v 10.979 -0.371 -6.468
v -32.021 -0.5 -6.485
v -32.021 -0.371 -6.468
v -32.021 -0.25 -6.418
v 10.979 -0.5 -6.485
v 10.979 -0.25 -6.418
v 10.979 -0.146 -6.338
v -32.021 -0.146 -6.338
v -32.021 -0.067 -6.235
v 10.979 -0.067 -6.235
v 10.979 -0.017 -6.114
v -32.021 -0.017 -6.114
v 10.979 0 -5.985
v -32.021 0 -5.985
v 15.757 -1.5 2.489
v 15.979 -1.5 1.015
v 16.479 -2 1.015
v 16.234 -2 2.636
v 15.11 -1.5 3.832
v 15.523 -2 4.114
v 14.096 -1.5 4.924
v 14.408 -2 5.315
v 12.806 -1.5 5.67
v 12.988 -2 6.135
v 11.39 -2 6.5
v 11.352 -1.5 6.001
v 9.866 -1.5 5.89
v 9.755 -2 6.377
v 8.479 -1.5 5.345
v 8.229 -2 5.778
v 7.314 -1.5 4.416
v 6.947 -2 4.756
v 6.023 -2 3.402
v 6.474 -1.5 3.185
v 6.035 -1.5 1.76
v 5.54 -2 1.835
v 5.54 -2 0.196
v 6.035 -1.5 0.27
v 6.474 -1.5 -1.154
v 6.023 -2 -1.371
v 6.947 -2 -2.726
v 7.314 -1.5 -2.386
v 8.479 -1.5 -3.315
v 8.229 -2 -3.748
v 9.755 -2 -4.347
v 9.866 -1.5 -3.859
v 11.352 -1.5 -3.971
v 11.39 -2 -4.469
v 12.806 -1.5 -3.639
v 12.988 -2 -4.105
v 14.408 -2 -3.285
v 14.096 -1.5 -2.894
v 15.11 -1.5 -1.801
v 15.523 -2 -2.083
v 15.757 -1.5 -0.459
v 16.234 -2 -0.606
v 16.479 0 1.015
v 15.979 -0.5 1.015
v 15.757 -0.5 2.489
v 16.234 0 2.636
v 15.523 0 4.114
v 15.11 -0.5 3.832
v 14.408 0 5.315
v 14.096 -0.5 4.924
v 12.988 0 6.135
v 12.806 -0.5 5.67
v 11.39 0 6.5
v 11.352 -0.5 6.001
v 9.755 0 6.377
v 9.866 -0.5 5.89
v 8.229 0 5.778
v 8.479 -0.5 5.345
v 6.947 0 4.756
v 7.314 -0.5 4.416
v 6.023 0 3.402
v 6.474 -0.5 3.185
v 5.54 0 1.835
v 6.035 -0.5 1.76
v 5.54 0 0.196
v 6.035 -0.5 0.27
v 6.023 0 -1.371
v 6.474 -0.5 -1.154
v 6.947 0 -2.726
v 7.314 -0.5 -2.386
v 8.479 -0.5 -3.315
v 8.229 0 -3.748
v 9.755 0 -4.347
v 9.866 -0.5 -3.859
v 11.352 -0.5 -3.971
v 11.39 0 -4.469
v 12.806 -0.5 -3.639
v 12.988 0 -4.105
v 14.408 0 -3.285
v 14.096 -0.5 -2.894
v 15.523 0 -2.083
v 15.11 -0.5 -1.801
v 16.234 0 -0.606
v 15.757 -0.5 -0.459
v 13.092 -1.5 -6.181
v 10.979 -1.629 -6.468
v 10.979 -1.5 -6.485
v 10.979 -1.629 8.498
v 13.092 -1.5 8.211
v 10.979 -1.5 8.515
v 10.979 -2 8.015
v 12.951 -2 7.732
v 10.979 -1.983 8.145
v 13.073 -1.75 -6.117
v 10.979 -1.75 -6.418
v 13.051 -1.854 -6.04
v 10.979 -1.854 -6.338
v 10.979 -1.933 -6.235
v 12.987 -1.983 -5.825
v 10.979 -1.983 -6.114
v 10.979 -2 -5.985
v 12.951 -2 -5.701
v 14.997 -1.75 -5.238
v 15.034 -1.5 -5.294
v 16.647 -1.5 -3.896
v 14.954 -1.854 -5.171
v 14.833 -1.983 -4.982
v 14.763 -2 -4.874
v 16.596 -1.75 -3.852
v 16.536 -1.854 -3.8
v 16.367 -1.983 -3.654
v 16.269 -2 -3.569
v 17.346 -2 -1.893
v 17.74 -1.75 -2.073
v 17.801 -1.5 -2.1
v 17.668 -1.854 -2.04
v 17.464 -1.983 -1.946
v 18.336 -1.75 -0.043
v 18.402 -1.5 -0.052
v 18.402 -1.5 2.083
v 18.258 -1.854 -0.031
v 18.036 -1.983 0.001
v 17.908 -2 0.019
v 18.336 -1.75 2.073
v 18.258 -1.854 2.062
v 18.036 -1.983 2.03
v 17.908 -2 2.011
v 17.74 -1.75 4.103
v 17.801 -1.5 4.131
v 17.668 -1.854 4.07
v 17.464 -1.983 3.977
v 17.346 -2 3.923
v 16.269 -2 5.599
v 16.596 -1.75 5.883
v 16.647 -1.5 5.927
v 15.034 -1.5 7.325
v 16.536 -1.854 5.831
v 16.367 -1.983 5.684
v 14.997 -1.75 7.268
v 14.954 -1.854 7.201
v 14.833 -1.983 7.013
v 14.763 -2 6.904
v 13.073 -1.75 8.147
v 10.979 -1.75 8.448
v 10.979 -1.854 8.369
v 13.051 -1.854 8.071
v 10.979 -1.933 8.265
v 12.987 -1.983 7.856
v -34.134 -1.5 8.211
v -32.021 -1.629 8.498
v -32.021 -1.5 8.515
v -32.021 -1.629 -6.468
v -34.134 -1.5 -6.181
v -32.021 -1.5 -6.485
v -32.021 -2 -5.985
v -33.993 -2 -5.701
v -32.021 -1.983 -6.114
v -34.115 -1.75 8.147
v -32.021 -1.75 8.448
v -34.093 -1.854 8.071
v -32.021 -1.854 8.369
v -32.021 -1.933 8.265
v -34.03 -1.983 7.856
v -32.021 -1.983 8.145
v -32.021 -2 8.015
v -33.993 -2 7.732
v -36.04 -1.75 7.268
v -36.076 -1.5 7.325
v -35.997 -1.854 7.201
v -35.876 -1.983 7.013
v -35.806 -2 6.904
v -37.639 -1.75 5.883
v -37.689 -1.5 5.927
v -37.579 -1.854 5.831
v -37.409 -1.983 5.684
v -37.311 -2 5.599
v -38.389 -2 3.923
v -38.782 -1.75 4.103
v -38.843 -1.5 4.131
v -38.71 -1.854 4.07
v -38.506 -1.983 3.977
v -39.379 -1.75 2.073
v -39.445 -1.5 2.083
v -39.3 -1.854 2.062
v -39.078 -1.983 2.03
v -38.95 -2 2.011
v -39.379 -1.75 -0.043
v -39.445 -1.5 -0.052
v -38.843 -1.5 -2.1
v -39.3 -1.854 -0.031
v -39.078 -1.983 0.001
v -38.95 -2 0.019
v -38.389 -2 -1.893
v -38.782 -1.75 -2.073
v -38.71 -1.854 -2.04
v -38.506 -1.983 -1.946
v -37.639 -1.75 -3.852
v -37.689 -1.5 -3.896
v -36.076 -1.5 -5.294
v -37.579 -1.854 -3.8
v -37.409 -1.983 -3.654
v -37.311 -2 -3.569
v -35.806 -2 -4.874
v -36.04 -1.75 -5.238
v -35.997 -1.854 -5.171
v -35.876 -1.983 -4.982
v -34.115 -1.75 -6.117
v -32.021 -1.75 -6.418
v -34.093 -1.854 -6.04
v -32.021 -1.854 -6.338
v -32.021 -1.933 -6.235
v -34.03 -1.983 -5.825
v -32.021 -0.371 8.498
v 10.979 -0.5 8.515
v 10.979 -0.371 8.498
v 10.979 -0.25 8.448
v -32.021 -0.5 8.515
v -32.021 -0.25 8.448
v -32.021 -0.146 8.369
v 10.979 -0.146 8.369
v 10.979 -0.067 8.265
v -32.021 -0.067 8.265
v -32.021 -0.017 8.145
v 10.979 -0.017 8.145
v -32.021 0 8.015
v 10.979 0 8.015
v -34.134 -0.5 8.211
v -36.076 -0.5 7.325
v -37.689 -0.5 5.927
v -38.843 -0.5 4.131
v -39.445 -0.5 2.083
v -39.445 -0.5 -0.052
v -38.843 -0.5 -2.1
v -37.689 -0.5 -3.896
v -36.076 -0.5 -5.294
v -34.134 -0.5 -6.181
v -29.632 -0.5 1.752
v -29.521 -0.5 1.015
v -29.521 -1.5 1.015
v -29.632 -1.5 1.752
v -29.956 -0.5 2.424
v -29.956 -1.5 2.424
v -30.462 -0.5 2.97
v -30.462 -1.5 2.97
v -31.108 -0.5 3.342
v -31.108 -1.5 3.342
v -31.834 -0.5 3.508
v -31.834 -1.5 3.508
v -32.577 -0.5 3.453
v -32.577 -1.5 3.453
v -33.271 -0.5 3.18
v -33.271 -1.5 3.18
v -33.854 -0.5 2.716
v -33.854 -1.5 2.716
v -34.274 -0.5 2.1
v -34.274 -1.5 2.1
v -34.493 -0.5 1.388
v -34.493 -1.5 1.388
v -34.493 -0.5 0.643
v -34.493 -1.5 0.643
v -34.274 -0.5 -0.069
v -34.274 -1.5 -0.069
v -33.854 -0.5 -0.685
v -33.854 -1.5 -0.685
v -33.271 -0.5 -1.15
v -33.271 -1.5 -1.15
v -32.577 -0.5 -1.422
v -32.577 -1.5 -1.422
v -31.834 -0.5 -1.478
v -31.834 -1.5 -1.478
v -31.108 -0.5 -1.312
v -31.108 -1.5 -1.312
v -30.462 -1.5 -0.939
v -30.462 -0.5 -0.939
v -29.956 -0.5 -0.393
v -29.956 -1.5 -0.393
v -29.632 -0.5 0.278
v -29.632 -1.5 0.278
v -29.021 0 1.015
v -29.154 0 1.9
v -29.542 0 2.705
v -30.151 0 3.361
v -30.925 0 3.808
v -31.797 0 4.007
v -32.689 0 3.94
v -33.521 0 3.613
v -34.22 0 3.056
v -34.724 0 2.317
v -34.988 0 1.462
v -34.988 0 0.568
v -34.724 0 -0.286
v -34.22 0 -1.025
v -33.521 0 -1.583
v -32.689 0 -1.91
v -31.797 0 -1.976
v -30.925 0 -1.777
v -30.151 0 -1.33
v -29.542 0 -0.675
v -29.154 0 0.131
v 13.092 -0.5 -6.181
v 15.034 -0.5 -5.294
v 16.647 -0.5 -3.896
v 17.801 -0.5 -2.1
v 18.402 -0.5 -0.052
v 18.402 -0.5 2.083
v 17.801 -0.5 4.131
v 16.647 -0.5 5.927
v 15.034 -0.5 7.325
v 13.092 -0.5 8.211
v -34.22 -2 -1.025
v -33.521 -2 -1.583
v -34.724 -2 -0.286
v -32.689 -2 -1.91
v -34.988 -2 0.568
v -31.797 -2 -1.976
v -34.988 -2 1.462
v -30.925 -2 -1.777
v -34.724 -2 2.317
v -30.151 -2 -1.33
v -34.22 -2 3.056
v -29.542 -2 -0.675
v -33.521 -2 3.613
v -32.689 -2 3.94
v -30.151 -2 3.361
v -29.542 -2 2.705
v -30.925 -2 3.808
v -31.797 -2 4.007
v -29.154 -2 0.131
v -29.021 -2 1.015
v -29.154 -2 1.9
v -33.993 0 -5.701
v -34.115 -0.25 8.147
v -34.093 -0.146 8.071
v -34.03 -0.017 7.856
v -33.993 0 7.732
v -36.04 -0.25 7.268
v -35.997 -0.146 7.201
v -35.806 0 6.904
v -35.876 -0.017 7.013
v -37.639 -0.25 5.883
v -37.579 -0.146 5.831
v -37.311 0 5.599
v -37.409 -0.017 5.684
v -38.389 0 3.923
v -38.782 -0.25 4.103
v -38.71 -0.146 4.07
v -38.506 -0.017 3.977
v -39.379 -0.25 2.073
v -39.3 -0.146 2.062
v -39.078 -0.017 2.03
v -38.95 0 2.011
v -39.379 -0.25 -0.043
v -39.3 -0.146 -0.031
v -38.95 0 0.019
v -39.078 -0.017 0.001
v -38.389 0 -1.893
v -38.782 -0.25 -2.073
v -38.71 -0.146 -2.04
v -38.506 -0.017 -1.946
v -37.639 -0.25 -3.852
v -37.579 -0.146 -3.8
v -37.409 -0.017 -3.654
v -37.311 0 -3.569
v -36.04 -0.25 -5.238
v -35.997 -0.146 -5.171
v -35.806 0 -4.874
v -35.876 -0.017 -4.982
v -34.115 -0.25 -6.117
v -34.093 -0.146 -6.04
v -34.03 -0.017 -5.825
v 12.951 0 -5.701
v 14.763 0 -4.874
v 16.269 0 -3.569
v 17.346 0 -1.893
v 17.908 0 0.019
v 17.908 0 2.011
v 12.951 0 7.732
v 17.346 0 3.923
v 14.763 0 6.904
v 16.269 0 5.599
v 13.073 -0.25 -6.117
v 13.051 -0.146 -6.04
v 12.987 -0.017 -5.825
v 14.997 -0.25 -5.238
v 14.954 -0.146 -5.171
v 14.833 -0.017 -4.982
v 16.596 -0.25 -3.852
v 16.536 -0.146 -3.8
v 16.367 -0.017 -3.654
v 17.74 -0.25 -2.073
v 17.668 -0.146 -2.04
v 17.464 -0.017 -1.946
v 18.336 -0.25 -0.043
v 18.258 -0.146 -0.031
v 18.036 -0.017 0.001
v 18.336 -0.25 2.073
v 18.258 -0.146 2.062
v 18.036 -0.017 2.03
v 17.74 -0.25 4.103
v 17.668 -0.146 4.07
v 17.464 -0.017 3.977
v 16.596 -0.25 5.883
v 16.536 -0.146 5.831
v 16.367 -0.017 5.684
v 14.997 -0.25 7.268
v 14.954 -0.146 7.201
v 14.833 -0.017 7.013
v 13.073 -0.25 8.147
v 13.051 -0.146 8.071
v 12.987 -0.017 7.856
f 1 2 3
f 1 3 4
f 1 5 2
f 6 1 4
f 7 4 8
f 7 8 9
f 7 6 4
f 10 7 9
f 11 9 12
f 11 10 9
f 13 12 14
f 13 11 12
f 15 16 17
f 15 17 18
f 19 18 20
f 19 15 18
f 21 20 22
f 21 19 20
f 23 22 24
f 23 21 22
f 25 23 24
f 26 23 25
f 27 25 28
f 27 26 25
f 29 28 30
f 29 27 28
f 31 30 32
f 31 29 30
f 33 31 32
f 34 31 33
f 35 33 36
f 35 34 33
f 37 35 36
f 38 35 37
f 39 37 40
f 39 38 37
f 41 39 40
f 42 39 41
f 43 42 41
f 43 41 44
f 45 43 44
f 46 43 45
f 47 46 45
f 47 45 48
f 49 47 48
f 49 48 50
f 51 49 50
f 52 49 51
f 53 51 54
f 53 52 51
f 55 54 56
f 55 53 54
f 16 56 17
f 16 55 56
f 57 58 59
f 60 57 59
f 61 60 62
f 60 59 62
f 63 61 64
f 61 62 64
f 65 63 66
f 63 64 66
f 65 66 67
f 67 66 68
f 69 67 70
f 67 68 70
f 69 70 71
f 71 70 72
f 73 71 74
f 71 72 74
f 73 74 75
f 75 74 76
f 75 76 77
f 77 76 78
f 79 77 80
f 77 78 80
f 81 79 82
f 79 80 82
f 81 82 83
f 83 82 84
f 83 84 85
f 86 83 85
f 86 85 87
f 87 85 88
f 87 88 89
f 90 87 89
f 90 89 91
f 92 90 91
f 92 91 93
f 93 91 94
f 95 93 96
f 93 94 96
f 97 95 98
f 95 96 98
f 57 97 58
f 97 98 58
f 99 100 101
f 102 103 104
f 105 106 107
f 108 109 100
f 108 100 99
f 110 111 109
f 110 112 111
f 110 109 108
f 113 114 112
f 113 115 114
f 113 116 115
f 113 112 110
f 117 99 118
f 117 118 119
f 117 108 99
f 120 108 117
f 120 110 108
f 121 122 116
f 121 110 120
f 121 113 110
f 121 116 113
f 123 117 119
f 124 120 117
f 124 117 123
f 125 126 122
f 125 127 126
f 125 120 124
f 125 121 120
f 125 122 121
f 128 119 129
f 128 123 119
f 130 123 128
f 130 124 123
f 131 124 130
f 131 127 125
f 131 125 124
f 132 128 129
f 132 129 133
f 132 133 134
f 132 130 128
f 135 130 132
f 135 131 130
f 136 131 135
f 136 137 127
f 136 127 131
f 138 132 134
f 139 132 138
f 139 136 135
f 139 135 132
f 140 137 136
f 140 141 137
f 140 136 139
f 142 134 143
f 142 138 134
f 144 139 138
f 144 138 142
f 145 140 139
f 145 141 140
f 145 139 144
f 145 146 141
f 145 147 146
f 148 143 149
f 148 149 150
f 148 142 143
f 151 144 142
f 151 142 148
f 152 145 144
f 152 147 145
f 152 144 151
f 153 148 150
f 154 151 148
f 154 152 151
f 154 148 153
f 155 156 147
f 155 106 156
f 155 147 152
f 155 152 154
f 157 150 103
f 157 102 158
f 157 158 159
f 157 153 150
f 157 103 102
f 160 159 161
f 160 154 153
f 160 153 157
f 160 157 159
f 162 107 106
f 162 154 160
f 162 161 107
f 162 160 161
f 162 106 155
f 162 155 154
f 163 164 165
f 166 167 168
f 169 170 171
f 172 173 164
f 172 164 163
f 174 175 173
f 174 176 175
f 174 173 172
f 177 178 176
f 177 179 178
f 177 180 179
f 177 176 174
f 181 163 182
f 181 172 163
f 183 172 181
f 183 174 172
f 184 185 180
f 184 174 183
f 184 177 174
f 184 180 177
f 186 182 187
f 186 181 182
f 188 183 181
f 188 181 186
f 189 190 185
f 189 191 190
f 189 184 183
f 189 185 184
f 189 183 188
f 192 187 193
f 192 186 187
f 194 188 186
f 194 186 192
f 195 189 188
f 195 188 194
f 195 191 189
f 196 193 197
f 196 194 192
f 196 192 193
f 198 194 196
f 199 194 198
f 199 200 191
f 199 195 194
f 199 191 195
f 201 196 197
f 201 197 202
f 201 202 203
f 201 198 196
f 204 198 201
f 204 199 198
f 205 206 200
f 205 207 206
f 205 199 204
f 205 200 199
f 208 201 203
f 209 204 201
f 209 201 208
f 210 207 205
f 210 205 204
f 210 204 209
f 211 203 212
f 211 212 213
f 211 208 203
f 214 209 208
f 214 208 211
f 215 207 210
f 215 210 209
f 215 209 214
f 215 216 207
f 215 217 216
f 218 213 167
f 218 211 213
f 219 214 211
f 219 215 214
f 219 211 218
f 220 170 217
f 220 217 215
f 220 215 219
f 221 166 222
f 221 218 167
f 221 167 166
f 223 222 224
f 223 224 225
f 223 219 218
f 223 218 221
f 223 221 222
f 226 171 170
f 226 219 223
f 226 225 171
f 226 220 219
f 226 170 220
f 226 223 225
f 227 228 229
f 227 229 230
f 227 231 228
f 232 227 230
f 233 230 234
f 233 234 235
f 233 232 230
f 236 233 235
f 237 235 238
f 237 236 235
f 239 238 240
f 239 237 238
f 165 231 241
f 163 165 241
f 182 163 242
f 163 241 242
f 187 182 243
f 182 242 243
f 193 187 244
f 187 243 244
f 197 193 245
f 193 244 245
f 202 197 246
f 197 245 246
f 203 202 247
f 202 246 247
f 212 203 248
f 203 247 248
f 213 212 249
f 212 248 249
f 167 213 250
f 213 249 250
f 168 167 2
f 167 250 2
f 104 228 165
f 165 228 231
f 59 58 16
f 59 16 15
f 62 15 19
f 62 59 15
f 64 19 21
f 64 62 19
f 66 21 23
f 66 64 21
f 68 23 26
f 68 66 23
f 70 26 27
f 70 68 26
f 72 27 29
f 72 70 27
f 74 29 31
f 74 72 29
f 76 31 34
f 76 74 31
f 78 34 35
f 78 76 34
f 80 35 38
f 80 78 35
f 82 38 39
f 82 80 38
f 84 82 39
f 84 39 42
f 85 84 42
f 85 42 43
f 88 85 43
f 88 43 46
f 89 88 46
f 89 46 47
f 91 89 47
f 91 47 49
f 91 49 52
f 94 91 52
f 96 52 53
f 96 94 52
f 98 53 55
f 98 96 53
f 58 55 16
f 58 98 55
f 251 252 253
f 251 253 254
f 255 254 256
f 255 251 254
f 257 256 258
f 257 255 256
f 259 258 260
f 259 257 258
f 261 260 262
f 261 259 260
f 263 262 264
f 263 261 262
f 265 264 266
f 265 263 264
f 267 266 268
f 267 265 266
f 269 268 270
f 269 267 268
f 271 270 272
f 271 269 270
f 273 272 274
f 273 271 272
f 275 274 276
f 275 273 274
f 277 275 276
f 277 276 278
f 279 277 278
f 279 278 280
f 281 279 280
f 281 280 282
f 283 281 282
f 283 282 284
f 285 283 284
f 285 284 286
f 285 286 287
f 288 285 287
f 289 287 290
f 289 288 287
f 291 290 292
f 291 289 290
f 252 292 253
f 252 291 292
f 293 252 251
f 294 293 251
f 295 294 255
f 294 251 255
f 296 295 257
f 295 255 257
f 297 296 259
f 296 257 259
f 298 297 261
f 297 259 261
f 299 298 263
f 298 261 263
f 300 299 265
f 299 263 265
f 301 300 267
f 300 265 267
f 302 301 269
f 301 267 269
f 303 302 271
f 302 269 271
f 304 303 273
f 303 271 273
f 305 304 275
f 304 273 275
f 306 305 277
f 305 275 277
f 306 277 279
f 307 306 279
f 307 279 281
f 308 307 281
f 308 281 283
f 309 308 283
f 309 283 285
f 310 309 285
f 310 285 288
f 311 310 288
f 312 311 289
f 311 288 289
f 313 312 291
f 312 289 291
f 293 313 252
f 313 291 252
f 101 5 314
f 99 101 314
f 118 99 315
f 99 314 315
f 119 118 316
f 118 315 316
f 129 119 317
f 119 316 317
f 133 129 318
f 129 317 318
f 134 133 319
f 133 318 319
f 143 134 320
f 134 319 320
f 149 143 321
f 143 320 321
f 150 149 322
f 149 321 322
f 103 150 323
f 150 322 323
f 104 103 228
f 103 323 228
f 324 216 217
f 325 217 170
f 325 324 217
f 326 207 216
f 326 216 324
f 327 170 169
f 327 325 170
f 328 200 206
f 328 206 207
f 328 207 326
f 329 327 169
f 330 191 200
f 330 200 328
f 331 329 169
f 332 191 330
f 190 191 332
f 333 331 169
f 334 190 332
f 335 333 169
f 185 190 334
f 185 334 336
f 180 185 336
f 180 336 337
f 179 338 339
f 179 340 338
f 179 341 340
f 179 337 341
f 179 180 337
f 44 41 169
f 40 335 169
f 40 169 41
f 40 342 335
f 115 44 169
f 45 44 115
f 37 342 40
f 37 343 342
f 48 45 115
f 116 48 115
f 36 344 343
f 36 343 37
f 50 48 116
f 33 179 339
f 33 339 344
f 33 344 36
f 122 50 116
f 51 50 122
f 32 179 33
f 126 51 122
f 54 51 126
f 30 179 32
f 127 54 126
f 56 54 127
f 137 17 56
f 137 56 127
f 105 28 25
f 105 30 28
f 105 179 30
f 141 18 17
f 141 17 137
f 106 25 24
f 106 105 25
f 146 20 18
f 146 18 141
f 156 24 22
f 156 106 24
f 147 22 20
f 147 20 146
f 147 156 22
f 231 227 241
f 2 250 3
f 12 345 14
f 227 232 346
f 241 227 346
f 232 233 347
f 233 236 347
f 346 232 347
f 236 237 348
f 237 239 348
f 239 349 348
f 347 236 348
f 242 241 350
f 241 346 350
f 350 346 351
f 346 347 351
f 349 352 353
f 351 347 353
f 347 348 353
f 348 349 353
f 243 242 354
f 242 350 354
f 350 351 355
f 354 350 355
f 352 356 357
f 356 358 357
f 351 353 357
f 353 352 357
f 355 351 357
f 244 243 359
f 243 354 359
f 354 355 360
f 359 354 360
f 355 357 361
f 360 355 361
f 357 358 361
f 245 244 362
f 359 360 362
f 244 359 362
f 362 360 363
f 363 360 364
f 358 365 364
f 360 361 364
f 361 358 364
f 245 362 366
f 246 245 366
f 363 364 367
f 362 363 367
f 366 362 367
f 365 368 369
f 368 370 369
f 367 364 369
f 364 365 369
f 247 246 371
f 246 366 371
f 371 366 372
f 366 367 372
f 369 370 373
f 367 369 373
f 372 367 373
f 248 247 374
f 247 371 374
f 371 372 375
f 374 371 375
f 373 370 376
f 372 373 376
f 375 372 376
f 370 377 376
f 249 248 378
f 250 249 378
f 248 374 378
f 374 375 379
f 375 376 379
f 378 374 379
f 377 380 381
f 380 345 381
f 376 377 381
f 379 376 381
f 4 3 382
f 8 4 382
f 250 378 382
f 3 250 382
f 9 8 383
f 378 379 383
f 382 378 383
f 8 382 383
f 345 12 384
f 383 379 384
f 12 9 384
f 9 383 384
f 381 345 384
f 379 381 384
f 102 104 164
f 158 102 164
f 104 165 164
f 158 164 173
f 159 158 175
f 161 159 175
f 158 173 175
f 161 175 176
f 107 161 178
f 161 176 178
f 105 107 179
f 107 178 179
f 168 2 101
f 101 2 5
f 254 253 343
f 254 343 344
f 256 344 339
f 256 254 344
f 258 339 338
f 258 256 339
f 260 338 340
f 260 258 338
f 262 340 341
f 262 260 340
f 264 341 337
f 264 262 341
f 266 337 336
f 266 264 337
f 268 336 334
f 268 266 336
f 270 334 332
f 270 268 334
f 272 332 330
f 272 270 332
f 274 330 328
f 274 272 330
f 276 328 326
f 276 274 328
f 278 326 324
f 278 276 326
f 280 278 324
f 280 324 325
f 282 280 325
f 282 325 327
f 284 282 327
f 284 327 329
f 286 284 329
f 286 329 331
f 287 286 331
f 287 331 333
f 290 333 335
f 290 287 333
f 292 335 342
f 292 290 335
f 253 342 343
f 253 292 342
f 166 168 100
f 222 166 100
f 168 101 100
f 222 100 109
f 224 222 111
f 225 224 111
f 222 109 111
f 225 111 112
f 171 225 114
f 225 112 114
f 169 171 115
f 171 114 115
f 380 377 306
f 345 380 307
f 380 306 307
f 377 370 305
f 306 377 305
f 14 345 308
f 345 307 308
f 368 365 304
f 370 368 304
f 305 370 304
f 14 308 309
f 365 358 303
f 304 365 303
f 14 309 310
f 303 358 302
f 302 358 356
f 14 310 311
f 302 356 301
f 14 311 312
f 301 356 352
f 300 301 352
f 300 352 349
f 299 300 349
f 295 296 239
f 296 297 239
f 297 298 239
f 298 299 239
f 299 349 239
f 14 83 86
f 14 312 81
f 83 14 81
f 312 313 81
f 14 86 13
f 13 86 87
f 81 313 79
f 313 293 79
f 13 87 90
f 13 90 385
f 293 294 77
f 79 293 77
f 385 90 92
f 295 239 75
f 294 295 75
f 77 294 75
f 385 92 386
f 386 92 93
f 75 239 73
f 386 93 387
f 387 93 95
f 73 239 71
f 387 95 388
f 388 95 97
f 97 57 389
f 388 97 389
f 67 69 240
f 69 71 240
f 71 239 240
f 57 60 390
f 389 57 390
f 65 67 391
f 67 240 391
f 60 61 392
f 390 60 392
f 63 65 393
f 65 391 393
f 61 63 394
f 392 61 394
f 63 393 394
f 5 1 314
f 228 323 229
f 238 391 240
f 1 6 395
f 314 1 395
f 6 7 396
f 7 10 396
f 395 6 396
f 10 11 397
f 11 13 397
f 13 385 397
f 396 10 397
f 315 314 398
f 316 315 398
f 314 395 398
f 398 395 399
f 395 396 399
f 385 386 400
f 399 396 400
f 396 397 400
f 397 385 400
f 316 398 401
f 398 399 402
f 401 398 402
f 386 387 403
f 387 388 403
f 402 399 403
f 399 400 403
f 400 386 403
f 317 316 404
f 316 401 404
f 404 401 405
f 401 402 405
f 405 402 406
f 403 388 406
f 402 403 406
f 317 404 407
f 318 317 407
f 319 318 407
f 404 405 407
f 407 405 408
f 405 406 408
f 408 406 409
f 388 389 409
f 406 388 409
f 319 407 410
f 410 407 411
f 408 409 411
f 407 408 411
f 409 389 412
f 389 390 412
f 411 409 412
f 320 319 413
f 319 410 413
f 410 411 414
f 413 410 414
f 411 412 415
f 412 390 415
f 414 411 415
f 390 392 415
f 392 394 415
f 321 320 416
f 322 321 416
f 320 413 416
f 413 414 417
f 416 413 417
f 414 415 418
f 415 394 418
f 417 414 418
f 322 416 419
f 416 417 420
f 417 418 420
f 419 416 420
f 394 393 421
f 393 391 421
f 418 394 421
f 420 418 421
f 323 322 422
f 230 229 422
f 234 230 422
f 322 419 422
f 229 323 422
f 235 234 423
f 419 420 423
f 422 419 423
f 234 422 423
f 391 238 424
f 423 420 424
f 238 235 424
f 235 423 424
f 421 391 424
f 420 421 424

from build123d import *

# Parameters (mm, degrees)
F0_R     = 2.5
F0_R_2   = 5
F1_DEPTH = 2
F2_R     = 0.5
F3_SIZE  = 0.5


with BuildPart() as f1:
    # F0 (on Front) → F1 (new body)
    with BuildSketch(Plane.XZ):
        with BuildLine():
            Line((10.978817, 8.515241), (-32.021183, 8.515241))
            ThreePointArc((-32.021183, 8.515241), (-39.521183, 1.015241), (-32.021183, -6.484759))
            Line((-32.021183, -6.484759), (10.978817, -6.484759))
            ThreePointArc((10.978817, -6.484759), (18.478817, 1.015241), (10.978817, 8.515241))
        make_face()
        with Locations((-32.021183, 1.015241)):
            Circle(F0_R, mode=Mode.SUBTRACT)
        with Locations((10.978817, 1.015241)):
            Circle(F0_R_2, mode=Mode.SUBTRACT)
    extrude(amount=F1_DEPTH)

    # F2
    f2_edges = [f1.edges().sort_by_distance(p)[0] for p in [
        (-10.521183, -2, 8.515241),
        (-39.521183, 0, 1.015241),
    ]]
    fillet(f2_edges, radius=F2_R)

    # F3
    f3_edges = [f1.edges().sort_by_distance(p)[0] for p in [
        (-34.521183, -2, 1.015241),
        (5.978817, -2, 1.015241),
        (-34.521183, 0, 1.015241),
        (5.978817, 0, 1.015241),
    ]]
    chamfer(f3_edges, length=F3_SIZE)


solid = f1.part
